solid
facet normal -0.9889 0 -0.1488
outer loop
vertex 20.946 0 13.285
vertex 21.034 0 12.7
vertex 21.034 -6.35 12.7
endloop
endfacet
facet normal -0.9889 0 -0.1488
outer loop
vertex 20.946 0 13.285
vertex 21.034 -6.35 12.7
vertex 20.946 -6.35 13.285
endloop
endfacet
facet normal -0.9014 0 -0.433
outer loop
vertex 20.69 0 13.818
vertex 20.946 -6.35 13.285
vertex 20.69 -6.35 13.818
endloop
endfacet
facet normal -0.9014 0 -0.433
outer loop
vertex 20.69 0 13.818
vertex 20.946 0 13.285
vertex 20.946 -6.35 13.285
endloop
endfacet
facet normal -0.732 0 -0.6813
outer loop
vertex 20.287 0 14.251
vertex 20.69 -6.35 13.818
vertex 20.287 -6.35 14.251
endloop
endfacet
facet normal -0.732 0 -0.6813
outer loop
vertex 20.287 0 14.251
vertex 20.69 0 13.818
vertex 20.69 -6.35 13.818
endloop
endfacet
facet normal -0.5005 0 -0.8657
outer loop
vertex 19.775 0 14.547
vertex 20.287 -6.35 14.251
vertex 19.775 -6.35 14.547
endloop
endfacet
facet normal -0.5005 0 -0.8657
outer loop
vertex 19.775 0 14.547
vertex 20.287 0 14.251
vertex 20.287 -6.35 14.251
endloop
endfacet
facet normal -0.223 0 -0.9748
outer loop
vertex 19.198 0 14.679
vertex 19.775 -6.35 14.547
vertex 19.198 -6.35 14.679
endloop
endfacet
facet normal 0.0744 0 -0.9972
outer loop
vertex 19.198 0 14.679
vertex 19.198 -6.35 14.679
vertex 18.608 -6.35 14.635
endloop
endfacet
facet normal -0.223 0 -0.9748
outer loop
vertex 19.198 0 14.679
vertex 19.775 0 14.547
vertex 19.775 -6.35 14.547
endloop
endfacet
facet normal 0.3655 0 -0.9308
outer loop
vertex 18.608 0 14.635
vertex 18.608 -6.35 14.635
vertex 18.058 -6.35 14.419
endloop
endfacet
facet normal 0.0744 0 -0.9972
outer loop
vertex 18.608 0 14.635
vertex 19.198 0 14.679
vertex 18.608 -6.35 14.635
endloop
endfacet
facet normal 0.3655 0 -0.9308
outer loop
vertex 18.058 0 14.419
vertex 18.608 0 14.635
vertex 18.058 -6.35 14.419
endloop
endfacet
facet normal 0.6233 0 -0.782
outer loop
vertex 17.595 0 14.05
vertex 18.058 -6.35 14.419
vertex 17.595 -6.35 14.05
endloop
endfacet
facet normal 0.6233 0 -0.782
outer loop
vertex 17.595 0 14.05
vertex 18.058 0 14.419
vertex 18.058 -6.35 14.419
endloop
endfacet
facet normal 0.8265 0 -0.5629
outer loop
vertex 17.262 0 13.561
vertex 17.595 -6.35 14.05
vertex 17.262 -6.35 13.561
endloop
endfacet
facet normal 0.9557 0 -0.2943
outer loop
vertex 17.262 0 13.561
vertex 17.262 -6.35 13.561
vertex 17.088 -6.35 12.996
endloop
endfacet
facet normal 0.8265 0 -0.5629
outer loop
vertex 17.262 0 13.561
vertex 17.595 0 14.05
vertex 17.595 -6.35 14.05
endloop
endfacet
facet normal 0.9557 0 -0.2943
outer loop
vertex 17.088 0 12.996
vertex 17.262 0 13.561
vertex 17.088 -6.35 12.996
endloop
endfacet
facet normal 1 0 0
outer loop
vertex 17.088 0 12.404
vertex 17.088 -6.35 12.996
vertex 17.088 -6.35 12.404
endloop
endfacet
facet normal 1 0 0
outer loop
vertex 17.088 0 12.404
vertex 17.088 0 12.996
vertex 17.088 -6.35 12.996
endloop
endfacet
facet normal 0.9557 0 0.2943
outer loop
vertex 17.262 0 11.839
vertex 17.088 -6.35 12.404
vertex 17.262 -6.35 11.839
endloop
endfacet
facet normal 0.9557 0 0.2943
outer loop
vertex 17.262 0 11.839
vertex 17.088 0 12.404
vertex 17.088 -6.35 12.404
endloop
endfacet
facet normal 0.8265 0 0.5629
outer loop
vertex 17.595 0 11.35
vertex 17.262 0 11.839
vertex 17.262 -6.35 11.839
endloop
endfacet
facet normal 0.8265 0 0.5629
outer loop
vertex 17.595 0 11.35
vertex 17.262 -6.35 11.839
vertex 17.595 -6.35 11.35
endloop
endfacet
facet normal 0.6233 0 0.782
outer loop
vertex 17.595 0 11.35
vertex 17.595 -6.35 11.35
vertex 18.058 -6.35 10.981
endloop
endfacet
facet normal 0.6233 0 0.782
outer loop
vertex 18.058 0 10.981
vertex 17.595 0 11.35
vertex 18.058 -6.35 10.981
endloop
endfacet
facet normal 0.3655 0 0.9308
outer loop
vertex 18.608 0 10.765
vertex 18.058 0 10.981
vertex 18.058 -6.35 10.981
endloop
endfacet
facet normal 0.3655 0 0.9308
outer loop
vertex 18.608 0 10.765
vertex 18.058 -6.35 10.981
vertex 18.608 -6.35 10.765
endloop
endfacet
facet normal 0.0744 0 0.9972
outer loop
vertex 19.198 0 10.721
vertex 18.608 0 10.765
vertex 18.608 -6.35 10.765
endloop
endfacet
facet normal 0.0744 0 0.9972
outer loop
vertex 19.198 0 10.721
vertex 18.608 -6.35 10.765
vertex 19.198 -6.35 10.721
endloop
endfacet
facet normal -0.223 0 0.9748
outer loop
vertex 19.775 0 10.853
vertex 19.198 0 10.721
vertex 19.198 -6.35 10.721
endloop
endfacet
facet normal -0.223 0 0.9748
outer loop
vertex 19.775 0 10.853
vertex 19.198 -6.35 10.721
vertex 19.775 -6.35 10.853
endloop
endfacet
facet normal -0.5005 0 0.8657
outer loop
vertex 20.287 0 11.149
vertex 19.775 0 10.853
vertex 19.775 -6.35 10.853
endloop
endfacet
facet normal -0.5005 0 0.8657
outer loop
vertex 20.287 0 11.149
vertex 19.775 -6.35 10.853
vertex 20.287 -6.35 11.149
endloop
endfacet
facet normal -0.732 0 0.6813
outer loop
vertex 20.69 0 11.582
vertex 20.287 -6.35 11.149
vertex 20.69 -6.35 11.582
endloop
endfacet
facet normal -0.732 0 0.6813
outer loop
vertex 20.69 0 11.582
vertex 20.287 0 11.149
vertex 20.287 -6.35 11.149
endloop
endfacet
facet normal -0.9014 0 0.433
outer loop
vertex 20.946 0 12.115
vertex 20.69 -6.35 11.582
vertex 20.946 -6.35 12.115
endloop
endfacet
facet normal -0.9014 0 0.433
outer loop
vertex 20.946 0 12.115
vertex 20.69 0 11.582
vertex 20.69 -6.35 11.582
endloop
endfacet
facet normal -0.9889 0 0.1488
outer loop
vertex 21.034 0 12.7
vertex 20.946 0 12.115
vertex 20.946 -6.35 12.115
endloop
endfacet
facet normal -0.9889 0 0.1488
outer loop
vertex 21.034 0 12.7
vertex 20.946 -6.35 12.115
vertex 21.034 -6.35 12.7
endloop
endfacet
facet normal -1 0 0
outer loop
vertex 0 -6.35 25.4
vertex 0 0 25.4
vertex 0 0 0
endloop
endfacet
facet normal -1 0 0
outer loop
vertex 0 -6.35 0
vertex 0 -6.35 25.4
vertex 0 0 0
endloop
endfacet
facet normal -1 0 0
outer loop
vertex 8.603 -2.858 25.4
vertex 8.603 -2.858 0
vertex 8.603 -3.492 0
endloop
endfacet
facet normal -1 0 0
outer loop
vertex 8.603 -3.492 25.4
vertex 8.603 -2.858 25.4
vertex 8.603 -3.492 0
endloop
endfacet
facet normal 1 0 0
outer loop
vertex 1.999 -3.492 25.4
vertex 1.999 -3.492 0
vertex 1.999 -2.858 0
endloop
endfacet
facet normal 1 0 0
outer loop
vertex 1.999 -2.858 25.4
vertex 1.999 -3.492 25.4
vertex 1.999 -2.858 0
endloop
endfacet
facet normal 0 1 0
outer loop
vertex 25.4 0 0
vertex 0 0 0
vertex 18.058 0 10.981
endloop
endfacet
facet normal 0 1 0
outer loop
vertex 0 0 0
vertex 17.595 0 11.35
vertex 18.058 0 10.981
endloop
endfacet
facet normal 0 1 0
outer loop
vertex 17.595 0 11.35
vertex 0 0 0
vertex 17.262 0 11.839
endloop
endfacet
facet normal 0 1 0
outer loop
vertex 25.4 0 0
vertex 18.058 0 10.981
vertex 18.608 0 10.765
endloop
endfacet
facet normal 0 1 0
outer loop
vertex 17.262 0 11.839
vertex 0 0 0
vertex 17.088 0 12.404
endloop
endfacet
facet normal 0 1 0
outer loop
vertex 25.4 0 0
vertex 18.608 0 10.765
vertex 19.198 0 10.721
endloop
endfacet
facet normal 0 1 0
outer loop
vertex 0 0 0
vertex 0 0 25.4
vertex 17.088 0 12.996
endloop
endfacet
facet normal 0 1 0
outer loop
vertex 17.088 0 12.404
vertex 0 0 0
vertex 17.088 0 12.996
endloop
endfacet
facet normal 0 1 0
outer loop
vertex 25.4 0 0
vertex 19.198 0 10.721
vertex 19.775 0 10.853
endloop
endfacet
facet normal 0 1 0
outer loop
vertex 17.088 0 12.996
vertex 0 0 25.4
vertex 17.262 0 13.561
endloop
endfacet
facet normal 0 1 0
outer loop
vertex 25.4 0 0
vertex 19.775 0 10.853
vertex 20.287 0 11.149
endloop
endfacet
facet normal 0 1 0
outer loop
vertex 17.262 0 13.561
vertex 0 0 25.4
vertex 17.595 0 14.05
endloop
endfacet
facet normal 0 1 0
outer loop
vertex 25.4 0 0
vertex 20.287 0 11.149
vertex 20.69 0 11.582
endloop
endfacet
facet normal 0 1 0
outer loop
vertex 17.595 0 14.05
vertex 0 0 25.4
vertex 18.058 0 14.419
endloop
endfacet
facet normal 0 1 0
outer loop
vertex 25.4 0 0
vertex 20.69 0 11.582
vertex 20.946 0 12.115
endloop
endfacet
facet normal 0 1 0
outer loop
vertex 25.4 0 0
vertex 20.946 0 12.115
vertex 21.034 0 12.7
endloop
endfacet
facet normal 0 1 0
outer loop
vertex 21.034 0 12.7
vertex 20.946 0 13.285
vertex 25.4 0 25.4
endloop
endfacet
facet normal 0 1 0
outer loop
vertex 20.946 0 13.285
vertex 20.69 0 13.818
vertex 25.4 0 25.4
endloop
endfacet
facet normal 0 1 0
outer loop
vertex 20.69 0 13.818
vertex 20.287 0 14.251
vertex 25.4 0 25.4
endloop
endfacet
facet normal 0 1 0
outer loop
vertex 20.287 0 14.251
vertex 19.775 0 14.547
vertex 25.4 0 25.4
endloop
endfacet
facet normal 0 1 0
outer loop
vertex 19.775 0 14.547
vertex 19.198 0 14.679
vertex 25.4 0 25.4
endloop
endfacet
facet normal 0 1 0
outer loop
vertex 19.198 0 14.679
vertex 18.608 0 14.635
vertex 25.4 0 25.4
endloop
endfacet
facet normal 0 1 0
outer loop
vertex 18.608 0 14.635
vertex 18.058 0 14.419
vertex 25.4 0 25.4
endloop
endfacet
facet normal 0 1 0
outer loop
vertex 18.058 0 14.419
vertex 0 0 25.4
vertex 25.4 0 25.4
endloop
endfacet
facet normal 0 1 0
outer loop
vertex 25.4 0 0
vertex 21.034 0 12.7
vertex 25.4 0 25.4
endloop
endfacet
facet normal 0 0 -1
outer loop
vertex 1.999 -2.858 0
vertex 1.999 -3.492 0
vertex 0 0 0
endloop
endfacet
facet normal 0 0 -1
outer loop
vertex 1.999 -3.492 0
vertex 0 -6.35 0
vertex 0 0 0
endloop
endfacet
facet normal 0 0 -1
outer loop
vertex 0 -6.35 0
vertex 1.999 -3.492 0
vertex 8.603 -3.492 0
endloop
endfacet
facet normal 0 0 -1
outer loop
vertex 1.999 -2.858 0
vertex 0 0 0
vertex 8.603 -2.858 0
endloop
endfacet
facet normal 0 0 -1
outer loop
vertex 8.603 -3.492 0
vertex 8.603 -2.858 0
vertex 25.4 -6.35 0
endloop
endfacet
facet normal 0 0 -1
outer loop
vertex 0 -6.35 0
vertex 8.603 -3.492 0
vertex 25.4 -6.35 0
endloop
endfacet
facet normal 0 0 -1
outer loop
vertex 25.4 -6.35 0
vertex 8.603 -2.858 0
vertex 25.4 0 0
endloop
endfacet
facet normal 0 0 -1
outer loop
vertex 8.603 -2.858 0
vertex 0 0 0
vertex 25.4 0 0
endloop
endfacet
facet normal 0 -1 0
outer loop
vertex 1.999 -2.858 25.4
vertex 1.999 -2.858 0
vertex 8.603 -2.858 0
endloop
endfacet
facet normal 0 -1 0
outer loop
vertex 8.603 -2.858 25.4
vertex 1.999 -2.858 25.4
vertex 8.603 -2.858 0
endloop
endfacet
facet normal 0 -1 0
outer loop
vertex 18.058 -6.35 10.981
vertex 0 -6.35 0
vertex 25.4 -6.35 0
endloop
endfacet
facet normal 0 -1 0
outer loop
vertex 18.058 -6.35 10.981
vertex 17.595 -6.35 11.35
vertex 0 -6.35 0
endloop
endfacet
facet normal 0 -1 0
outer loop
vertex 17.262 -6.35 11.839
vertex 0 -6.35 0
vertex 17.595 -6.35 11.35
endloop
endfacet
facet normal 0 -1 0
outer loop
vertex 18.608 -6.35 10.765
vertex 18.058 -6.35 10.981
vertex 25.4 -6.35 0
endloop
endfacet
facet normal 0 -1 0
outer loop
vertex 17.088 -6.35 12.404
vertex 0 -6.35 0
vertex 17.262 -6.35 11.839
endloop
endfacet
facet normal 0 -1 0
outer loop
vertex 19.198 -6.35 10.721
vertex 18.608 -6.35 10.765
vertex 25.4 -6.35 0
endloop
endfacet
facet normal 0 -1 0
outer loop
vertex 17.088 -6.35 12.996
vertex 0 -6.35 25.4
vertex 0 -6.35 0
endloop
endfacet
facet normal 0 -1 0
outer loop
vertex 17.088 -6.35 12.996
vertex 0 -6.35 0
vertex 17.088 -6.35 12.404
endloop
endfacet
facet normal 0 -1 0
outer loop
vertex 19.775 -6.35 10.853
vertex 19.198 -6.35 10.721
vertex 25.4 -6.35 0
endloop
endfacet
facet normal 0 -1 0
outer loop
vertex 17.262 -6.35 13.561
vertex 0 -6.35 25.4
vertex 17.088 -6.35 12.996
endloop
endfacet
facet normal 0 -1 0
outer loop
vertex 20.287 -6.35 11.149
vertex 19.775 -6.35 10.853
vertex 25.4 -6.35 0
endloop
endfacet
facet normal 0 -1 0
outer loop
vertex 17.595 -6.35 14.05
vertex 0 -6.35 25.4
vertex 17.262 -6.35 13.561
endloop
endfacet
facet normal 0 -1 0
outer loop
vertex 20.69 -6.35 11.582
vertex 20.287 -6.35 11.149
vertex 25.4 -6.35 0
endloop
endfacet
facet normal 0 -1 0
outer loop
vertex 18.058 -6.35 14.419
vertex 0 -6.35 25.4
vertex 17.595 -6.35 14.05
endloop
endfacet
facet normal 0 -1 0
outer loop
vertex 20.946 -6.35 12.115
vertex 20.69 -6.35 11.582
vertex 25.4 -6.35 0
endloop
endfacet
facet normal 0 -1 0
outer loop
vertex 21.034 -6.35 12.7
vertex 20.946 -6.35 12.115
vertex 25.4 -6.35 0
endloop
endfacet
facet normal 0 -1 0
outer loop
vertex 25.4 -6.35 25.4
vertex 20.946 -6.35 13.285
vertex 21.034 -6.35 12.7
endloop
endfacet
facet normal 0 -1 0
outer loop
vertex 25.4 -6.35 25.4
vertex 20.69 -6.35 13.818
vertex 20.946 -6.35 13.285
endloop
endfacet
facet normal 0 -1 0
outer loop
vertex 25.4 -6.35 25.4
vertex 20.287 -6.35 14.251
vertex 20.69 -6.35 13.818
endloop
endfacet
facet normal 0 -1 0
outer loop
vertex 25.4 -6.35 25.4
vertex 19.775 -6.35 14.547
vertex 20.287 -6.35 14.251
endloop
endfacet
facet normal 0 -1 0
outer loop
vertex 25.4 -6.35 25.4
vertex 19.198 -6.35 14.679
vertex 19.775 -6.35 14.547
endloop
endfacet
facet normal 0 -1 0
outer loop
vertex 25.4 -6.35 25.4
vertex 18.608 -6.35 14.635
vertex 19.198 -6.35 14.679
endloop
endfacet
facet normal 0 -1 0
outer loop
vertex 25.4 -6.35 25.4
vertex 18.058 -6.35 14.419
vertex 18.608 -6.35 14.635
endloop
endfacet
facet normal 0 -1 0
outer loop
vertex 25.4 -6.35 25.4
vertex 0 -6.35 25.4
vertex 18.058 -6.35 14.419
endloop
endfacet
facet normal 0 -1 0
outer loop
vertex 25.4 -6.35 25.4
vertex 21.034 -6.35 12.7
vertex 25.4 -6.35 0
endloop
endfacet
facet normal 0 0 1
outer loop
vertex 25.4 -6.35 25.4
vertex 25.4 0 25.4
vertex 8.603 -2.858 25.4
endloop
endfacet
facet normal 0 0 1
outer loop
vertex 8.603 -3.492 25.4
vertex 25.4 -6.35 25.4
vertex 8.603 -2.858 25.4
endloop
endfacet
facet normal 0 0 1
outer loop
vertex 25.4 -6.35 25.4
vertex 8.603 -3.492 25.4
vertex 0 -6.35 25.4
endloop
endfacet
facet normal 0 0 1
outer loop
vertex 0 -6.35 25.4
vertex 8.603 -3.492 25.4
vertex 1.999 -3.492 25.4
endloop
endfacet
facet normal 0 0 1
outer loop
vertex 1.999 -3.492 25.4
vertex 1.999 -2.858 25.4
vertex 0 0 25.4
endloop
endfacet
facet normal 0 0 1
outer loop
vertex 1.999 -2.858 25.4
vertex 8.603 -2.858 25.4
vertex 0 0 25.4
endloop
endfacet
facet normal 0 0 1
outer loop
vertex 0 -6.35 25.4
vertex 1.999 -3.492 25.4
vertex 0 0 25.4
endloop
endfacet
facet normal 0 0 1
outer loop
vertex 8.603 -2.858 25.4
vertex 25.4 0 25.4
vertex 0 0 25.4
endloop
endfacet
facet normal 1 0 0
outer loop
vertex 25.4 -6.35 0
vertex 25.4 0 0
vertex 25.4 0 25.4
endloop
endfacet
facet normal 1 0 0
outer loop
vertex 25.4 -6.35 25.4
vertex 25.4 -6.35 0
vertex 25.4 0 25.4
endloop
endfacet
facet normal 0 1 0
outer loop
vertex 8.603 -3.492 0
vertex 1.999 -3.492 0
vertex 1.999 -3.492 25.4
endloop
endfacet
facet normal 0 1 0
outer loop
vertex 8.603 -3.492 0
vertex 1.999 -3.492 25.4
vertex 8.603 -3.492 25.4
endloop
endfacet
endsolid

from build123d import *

# Parameters (mm, degrees)
F0_R     = 1.984375
F1_DEPTH = 6.35
F2_W     = 6.604
F2_H     = 0.3175
F3_DEPTH = 76.2


with BuildPart() as f1:
    # F0 (on Front) → F1 (new body)
    with BuildSketch(Plane.XZ):
        Polygon((0, 12.7), (0, 0), (25.4, 0), (25.4, 25.4), (0, 25.4), align=None)
        with Locations((19.05, 12.7)):
            Circle(F0_R, mode=Mode.SUBTRACT)
    extrude(amount=F1_DEPTH)

    # F2 (on face) → F3 (cut)
    with BuildSketch(Plane(origin=(0, 0, 0), x_dir=(1, 0, 0), z_dir=(0, 0, -1))):
        with Locations((5.300516, 3.33375)):
            Rectangle(F2_W, F2_H)
        with Locations((5.300516, 3.01625)):
            Rectangle(F2_W, F2_H)
    extrude(amount=-F3_DEPTH, mode=Mode.SUBTRACT)


solid = f1.part
